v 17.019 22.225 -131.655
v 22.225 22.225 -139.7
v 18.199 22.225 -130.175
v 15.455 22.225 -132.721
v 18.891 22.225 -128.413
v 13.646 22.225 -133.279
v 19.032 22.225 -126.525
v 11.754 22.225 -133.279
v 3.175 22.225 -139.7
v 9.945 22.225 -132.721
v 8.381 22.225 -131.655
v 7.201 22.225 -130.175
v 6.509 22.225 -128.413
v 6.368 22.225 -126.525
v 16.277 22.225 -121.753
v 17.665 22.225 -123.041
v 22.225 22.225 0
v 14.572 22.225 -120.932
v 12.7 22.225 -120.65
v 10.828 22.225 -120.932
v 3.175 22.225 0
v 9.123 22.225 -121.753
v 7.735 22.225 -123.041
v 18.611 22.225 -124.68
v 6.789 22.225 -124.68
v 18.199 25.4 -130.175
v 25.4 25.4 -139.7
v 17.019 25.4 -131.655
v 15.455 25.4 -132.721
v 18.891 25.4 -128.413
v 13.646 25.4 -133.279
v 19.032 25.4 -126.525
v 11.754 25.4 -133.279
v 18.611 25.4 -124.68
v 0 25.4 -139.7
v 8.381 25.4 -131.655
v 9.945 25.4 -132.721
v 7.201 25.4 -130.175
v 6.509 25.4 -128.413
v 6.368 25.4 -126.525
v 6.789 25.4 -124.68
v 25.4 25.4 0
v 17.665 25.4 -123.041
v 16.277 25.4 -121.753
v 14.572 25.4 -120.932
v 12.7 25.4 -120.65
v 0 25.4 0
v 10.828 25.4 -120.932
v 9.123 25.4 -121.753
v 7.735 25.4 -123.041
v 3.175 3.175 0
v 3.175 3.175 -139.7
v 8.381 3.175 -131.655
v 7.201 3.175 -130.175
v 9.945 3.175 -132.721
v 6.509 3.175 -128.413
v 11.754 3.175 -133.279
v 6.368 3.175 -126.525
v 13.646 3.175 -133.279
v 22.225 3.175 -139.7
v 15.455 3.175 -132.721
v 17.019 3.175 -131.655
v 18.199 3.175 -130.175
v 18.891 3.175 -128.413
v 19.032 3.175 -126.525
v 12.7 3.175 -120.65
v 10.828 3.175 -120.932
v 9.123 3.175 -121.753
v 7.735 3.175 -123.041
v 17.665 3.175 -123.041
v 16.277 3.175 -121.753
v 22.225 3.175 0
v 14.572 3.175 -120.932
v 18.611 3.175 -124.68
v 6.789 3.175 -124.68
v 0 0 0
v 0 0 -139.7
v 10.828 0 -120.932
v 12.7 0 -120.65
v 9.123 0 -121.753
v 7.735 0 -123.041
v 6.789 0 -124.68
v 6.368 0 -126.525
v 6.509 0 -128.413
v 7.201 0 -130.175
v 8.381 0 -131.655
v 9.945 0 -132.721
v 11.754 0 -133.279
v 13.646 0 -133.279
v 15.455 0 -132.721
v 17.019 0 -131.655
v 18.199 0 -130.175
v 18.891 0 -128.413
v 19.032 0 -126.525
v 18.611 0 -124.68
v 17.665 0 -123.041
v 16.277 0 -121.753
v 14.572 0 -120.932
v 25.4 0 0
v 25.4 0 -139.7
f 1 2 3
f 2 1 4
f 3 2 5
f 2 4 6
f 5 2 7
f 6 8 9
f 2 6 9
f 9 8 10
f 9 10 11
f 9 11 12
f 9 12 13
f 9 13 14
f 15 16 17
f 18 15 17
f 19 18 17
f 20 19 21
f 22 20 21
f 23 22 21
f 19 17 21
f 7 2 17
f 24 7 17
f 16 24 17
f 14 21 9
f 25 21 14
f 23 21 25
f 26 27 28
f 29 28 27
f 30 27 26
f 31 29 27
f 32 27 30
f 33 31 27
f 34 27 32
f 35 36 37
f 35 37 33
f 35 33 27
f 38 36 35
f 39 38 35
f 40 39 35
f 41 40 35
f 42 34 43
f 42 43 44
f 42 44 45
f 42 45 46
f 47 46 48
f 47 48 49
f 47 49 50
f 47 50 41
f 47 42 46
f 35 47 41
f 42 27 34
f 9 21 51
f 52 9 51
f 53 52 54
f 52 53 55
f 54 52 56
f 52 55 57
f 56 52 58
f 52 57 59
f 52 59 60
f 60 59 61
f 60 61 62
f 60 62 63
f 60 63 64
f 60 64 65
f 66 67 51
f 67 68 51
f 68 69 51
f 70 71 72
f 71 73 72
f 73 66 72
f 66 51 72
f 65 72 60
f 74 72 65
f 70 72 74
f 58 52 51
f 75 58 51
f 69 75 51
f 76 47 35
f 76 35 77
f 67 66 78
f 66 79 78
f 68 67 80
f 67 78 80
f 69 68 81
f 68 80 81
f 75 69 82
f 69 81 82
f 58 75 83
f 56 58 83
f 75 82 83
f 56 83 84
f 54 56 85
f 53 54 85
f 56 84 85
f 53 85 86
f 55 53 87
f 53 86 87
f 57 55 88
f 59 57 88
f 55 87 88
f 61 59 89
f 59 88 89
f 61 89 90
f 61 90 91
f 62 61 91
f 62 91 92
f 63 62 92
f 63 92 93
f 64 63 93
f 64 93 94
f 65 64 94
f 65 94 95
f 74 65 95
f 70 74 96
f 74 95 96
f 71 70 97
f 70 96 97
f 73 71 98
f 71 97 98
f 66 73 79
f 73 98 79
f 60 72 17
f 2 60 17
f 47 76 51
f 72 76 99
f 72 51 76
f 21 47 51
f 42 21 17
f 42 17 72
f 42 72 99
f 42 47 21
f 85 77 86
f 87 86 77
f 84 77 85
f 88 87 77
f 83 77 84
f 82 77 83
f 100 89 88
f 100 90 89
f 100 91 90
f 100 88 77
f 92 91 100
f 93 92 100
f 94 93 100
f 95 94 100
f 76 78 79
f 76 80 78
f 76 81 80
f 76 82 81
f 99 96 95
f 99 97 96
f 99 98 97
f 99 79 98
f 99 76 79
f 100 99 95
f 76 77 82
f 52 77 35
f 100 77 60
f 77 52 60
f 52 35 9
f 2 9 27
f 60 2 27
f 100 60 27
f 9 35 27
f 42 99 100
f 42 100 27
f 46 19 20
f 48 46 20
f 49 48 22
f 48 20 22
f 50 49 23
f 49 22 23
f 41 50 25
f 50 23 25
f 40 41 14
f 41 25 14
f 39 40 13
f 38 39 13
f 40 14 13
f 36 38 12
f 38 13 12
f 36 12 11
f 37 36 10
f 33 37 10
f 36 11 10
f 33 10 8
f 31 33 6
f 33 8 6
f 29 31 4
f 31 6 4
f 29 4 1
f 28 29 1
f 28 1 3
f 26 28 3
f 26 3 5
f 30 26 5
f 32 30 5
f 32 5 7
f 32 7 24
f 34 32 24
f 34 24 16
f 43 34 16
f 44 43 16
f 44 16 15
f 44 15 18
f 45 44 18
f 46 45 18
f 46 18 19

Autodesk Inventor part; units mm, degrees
ref_plane "YZ Plane" through (0, 0, 0) normal (1, 0, 0) x (0, 1, 0)
ref_plane "XZ Plane" through (0, 0, 0) normal (0, 1, 0) x (-1, 0, 0)
ref_plane "XY Plane" through (0, 0, 0) normal (0, 0, 1) x (1, 0, 0)
sketch "Sketch1" plane through (0, 0, 0) normal (0, 0, 1) x (1, 0, 0)
  line L0 (0, 0) -> (25.4, 0)
  line L1 (25.4, 0) -> (25.4, 25.4)
  line L2 (25.4, 25.4) -> (0, 25.4)
  line L3 (0, 25.4) -> (0, 0)
  line L4 (3.175, 3.175) -> (22.225, 3.175)
  line L5 (22.225, 3.175) -> (22.225, 22.225)
  line L6 (22.225, 22.225) -> (3.175, 22.225)
  line L7 (3.175, 22.225) -> (3.175, 3.175)
  dimension "d0" = 25.4
  dimension "d1" = 25.4
  dimension "d2" = 3.175
extrude "Extrusion1" add sketch "Sketch1" against normal blind 139.7
sketch "Sketch2" plane through (0, 25.4, 0) normal (0, 1, 0) x (1, 0, 0)
  line L0 (25.4, 139.7) -> (0, 139.7) projected
  point P0 (12.7, 127)
  dimension "d5" = 12.7
hole "Hole1" at (12.7, 25.4, -127) direction (0, -1, 0) diameter 12.7 depth 25.4 tip angle 118
properties part number "short thing"
